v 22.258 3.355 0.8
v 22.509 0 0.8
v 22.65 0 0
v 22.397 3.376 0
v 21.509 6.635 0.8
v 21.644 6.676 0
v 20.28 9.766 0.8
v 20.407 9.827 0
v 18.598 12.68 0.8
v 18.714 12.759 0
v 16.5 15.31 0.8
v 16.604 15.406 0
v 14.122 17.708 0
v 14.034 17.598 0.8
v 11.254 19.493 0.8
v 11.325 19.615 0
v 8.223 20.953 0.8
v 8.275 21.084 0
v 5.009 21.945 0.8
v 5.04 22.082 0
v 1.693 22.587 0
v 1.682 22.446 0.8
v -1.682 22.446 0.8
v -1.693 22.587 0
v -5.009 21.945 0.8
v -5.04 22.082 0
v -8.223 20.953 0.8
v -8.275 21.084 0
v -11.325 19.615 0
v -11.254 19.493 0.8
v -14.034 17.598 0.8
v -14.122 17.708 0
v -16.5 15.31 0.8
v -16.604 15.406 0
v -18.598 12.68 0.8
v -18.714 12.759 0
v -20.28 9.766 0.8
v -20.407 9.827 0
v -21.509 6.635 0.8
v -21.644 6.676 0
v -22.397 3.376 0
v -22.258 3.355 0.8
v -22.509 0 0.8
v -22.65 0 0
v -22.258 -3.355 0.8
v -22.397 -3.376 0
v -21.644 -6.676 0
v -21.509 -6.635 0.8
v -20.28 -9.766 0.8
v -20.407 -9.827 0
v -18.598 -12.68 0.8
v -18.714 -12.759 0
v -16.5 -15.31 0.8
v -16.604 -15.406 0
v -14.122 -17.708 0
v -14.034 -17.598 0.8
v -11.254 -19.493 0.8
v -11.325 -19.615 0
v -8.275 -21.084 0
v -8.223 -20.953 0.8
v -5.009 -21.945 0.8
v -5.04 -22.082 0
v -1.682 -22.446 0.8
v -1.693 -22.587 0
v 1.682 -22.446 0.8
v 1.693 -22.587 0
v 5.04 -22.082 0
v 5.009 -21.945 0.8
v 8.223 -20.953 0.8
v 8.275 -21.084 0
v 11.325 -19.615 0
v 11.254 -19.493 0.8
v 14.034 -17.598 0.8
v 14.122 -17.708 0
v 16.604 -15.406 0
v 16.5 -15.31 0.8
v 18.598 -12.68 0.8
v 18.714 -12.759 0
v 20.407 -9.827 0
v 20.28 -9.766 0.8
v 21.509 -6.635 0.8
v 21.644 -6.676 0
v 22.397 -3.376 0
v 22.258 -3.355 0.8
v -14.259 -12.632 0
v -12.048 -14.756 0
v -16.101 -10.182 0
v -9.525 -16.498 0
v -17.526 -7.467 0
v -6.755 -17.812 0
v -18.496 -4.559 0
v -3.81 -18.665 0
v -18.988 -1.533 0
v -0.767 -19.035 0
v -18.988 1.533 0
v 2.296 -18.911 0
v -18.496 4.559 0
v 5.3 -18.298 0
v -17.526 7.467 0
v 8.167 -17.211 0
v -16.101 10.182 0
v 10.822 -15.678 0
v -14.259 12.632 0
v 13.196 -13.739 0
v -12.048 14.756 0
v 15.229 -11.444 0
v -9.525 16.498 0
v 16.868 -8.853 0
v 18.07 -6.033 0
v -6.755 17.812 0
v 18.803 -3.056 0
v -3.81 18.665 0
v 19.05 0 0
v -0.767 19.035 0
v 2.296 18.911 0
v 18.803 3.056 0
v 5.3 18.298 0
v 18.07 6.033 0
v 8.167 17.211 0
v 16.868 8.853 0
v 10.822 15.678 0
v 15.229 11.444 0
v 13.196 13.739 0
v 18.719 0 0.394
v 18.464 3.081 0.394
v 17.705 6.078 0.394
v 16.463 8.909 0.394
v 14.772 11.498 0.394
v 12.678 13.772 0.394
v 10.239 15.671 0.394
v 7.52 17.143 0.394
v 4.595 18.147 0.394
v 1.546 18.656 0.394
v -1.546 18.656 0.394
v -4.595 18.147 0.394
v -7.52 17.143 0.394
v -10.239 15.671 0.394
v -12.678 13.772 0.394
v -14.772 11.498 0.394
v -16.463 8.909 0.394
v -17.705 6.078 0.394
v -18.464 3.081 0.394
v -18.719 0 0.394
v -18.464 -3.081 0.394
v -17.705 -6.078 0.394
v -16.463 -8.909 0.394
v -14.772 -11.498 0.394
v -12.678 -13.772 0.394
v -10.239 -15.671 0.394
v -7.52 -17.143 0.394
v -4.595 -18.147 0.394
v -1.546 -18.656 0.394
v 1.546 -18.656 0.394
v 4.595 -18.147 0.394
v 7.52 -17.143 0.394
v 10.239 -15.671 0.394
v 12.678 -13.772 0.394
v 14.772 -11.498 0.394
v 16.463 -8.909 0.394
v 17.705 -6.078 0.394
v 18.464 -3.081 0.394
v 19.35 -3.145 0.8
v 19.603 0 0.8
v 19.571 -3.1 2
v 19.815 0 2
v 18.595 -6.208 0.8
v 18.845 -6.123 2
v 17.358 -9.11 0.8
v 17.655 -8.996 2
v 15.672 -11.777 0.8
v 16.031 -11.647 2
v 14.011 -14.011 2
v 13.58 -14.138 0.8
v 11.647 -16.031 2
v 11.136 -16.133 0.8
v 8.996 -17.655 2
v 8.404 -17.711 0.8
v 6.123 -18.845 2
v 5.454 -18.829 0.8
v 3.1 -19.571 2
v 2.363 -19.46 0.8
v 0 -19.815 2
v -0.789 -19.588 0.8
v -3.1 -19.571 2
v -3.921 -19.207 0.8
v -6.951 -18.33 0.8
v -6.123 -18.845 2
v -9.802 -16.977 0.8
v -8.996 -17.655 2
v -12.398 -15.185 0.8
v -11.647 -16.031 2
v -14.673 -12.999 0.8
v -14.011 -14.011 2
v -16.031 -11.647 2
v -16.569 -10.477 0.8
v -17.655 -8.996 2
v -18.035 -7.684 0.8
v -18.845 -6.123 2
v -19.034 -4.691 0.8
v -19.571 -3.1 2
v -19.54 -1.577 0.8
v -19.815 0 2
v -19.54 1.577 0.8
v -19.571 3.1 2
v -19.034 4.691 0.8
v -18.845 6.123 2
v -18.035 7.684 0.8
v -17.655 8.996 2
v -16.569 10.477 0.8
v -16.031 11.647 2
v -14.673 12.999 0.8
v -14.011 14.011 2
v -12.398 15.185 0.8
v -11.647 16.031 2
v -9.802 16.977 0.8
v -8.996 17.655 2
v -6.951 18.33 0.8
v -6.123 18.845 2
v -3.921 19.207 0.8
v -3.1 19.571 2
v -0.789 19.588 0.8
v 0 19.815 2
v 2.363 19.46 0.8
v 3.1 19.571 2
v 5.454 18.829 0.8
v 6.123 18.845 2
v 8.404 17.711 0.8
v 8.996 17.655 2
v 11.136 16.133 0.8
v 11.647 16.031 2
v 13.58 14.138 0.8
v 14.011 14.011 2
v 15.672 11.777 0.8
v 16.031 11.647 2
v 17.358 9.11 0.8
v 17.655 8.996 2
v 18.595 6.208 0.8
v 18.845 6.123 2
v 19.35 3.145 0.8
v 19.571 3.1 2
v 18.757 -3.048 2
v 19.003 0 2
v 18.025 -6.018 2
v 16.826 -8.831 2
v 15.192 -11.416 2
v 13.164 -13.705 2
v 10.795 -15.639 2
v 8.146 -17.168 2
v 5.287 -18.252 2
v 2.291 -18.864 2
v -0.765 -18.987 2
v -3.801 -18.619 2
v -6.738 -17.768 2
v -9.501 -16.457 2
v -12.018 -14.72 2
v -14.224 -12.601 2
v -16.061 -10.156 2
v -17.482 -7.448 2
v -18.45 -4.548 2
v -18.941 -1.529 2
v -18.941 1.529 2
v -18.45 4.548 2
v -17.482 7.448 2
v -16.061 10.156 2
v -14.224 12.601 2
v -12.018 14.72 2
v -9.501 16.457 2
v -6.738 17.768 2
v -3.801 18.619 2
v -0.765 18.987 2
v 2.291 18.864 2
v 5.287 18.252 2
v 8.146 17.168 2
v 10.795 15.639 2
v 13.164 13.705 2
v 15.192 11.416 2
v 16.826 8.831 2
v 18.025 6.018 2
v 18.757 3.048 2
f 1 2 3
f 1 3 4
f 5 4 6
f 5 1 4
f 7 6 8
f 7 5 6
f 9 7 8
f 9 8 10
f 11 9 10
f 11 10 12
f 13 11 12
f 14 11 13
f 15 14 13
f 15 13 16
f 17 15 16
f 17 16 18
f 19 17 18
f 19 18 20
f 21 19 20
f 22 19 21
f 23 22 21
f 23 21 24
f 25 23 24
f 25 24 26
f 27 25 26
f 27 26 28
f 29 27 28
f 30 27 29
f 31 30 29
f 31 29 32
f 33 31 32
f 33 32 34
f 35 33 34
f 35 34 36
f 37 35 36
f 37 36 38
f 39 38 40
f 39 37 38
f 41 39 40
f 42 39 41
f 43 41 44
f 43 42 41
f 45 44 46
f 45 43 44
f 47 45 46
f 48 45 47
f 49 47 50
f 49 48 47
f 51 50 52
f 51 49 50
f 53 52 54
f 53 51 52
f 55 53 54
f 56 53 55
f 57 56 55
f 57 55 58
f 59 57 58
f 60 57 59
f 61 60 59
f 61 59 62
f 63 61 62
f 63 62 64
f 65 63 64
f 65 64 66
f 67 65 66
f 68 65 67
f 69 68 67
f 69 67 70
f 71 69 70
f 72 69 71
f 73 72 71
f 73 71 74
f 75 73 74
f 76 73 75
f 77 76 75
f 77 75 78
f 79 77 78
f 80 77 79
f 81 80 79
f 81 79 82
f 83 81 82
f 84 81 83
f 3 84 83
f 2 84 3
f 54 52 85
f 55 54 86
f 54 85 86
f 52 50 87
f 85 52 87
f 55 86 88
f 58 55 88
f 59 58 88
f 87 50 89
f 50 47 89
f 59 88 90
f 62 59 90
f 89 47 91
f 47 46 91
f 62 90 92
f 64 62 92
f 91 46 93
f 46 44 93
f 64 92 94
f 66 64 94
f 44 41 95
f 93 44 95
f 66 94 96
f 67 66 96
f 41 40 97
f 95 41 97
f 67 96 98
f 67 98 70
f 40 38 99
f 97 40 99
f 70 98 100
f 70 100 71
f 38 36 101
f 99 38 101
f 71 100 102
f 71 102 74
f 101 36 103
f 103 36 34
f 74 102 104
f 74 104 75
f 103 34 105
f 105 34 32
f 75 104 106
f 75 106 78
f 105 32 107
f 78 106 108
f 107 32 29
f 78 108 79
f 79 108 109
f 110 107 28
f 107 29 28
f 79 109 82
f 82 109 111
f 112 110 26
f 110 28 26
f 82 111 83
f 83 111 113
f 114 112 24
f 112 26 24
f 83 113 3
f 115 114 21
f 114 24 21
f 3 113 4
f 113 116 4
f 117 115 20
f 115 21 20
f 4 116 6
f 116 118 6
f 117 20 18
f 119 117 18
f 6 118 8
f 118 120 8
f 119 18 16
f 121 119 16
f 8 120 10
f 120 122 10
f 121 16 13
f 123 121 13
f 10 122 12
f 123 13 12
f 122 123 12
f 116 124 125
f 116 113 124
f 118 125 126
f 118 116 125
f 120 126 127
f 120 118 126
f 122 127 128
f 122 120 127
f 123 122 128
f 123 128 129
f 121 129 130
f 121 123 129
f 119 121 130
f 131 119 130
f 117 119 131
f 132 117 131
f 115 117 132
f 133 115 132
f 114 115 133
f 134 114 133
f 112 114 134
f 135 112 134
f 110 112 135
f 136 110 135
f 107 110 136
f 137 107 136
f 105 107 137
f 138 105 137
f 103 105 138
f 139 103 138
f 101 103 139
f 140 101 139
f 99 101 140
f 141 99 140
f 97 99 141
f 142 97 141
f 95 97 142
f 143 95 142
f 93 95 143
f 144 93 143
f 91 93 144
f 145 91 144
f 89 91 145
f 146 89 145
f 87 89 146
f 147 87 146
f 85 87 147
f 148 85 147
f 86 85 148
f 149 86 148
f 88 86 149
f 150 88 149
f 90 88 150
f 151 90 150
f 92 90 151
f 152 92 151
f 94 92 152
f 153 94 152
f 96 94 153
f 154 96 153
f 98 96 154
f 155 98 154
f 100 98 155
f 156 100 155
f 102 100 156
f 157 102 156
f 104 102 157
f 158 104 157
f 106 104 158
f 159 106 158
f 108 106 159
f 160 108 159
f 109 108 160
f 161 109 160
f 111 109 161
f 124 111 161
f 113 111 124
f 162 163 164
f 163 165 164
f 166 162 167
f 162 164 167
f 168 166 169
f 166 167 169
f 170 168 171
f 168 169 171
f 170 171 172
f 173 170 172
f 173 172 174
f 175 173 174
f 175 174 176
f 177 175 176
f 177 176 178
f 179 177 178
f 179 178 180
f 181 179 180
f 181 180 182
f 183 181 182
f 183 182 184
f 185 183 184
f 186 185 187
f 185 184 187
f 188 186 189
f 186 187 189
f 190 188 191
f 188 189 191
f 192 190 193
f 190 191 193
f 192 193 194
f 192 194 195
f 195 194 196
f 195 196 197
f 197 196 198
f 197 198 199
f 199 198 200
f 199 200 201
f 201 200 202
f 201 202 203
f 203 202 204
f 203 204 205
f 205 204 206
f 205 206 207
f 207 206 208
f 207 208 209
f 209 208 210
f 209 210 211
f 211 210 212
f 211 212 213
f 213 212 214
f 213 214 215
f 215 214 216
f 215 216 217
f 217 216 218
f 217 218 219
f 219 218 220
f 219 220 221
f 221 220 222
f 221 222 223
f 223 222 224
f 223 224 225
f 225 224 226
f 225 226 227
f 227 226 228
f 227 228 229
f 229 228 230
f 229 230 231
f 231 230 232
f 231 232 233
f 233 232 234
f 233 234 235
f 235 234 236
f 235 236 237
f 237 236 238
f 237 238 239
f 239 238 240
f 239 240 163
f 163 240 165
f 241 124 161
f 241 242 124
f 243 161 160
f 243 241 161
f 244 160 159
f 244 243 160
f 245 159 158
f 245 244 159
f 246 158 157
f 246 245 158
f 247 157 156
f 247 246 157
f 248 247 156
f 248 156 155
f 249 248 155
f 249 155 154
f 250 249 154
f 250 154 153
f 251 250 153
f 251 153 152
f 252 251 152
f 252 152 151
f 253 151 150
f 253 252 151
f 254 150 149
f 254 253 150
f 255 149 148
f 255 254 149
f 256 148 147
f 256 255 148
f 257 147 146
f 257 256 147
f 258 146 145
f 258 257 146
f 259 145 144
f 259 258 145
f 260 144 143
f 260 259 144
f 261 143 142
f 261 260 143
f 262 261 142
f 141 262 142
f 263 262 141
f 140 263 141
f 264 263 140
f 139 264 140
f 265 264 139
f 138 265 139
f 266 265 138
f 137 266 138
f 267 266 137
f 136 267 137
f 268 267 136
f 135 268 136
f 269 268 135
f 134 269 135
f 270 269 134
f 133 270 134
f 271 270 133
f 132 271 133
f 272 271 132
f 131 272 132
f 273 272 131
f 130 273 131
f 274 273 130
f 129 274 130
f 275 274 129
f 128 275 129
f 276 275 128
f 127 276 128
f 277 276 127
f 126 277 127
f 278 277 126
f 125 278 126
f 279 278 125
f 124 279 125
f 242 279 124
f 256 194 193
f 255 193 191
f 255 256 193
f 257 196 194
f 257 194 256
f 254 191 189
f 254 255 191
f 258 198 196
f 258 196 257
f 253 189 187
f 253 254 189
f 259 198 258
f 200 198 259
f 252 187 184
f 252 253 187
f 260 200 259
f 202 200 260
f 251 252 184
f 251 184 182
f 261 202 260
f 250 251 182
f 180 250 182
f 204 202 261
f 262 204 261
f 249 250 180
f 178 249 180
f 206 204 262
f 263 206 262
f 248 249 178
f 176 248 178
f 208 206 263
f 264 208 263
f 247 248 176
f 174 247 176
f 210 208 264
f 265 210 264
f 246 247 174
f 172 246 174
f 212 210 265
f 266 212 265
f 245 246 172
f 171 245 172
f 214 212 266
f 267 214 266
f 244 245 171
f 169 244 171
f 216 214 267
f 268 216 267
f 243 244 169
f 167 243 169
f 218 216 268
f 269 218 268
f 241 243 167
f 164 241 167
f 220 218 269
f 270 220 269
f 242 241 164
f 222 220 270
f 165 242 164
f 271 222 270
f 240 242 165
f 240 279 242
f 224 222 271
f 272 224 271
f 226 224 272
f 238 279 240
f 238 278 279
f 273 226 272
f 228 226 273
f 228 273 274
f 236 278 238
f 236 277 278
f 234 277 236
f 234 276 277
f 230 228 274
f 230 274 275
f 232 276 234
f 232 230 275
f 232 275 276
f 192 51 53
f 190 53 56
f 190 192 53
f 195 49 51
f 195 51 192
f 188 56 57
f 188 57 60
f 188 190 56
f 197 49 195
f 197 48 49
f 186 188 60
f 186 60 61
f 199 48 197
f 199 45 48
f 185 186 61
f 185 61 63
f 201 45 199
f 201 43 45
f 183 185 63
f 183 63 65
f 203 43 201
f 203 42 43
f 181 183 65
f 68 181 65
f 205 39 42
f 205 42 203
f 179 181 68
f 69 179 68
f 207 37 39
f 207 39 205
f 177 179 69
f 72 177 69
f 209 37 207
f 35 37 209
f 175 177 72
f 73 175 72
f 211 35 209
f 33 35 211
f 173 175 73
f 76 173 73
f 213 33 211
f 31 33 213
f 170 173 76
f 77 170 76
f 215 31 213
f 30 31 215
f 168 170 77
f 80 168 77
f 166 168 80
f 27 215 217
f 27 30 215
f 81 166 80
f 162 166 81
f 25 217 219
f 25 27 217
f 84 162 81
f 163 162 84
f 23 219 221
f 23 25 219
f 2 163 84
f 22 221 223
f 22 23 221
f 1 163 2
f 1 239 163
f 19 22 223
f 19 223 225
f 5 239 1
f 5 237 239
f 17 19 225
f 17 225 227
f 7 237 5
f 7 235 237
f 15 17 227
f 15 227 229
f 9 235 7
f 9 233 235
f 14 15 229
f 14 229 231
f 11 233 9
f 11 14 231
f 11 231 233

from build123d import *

# Parameters (mm, degrees)
F0_R     = 22.65
F0_R_2   = 18.65
F1_DEPTH = 2
F1_TAPER = 10
F2_T     = -0.8


# Not quite as in the source:
# - a fillet or chamfer that OpenCascade refuses, or shapes differently, is made with other operations: its cross-section is extruded or revolved along the edge and cut away or added


with BuildPart() as f1:
    # F0 (on Top) → F1 (new body)
    with BuildSketch(Plane.XY):
        Circle(F0_R)
        Circle(F0_R_2, mode=Mode.SUBTRACT)
    extrude(amount=F1_DEPTH, taper=F1_TAPER)

    # F2
    f2_openings = [f1.faces().sort_by_distance(p)[0] for p in [
        (-21.666682, 0, 2),
        (-22.473673, 0, 1),
    ]]
    offset(amount=F2_T, openings=f2_openings, kind=Kind.INTERSECTION)

    # F3: chamfer of 0.4 on 1 edges, made by hand

    # F3_s1 → F3_t2 (revolve, cut)
    with BuildSketch(Plane.XZ):
        Polygon((18.7194592711, 0.3939231012), (19.05, 0), (18.65, 0), align=None)
    revolve(axis=Axis((0, 0, 0), (0, 0, 1)), mode=Mode.SUBTRACT)


solid = f1.part
